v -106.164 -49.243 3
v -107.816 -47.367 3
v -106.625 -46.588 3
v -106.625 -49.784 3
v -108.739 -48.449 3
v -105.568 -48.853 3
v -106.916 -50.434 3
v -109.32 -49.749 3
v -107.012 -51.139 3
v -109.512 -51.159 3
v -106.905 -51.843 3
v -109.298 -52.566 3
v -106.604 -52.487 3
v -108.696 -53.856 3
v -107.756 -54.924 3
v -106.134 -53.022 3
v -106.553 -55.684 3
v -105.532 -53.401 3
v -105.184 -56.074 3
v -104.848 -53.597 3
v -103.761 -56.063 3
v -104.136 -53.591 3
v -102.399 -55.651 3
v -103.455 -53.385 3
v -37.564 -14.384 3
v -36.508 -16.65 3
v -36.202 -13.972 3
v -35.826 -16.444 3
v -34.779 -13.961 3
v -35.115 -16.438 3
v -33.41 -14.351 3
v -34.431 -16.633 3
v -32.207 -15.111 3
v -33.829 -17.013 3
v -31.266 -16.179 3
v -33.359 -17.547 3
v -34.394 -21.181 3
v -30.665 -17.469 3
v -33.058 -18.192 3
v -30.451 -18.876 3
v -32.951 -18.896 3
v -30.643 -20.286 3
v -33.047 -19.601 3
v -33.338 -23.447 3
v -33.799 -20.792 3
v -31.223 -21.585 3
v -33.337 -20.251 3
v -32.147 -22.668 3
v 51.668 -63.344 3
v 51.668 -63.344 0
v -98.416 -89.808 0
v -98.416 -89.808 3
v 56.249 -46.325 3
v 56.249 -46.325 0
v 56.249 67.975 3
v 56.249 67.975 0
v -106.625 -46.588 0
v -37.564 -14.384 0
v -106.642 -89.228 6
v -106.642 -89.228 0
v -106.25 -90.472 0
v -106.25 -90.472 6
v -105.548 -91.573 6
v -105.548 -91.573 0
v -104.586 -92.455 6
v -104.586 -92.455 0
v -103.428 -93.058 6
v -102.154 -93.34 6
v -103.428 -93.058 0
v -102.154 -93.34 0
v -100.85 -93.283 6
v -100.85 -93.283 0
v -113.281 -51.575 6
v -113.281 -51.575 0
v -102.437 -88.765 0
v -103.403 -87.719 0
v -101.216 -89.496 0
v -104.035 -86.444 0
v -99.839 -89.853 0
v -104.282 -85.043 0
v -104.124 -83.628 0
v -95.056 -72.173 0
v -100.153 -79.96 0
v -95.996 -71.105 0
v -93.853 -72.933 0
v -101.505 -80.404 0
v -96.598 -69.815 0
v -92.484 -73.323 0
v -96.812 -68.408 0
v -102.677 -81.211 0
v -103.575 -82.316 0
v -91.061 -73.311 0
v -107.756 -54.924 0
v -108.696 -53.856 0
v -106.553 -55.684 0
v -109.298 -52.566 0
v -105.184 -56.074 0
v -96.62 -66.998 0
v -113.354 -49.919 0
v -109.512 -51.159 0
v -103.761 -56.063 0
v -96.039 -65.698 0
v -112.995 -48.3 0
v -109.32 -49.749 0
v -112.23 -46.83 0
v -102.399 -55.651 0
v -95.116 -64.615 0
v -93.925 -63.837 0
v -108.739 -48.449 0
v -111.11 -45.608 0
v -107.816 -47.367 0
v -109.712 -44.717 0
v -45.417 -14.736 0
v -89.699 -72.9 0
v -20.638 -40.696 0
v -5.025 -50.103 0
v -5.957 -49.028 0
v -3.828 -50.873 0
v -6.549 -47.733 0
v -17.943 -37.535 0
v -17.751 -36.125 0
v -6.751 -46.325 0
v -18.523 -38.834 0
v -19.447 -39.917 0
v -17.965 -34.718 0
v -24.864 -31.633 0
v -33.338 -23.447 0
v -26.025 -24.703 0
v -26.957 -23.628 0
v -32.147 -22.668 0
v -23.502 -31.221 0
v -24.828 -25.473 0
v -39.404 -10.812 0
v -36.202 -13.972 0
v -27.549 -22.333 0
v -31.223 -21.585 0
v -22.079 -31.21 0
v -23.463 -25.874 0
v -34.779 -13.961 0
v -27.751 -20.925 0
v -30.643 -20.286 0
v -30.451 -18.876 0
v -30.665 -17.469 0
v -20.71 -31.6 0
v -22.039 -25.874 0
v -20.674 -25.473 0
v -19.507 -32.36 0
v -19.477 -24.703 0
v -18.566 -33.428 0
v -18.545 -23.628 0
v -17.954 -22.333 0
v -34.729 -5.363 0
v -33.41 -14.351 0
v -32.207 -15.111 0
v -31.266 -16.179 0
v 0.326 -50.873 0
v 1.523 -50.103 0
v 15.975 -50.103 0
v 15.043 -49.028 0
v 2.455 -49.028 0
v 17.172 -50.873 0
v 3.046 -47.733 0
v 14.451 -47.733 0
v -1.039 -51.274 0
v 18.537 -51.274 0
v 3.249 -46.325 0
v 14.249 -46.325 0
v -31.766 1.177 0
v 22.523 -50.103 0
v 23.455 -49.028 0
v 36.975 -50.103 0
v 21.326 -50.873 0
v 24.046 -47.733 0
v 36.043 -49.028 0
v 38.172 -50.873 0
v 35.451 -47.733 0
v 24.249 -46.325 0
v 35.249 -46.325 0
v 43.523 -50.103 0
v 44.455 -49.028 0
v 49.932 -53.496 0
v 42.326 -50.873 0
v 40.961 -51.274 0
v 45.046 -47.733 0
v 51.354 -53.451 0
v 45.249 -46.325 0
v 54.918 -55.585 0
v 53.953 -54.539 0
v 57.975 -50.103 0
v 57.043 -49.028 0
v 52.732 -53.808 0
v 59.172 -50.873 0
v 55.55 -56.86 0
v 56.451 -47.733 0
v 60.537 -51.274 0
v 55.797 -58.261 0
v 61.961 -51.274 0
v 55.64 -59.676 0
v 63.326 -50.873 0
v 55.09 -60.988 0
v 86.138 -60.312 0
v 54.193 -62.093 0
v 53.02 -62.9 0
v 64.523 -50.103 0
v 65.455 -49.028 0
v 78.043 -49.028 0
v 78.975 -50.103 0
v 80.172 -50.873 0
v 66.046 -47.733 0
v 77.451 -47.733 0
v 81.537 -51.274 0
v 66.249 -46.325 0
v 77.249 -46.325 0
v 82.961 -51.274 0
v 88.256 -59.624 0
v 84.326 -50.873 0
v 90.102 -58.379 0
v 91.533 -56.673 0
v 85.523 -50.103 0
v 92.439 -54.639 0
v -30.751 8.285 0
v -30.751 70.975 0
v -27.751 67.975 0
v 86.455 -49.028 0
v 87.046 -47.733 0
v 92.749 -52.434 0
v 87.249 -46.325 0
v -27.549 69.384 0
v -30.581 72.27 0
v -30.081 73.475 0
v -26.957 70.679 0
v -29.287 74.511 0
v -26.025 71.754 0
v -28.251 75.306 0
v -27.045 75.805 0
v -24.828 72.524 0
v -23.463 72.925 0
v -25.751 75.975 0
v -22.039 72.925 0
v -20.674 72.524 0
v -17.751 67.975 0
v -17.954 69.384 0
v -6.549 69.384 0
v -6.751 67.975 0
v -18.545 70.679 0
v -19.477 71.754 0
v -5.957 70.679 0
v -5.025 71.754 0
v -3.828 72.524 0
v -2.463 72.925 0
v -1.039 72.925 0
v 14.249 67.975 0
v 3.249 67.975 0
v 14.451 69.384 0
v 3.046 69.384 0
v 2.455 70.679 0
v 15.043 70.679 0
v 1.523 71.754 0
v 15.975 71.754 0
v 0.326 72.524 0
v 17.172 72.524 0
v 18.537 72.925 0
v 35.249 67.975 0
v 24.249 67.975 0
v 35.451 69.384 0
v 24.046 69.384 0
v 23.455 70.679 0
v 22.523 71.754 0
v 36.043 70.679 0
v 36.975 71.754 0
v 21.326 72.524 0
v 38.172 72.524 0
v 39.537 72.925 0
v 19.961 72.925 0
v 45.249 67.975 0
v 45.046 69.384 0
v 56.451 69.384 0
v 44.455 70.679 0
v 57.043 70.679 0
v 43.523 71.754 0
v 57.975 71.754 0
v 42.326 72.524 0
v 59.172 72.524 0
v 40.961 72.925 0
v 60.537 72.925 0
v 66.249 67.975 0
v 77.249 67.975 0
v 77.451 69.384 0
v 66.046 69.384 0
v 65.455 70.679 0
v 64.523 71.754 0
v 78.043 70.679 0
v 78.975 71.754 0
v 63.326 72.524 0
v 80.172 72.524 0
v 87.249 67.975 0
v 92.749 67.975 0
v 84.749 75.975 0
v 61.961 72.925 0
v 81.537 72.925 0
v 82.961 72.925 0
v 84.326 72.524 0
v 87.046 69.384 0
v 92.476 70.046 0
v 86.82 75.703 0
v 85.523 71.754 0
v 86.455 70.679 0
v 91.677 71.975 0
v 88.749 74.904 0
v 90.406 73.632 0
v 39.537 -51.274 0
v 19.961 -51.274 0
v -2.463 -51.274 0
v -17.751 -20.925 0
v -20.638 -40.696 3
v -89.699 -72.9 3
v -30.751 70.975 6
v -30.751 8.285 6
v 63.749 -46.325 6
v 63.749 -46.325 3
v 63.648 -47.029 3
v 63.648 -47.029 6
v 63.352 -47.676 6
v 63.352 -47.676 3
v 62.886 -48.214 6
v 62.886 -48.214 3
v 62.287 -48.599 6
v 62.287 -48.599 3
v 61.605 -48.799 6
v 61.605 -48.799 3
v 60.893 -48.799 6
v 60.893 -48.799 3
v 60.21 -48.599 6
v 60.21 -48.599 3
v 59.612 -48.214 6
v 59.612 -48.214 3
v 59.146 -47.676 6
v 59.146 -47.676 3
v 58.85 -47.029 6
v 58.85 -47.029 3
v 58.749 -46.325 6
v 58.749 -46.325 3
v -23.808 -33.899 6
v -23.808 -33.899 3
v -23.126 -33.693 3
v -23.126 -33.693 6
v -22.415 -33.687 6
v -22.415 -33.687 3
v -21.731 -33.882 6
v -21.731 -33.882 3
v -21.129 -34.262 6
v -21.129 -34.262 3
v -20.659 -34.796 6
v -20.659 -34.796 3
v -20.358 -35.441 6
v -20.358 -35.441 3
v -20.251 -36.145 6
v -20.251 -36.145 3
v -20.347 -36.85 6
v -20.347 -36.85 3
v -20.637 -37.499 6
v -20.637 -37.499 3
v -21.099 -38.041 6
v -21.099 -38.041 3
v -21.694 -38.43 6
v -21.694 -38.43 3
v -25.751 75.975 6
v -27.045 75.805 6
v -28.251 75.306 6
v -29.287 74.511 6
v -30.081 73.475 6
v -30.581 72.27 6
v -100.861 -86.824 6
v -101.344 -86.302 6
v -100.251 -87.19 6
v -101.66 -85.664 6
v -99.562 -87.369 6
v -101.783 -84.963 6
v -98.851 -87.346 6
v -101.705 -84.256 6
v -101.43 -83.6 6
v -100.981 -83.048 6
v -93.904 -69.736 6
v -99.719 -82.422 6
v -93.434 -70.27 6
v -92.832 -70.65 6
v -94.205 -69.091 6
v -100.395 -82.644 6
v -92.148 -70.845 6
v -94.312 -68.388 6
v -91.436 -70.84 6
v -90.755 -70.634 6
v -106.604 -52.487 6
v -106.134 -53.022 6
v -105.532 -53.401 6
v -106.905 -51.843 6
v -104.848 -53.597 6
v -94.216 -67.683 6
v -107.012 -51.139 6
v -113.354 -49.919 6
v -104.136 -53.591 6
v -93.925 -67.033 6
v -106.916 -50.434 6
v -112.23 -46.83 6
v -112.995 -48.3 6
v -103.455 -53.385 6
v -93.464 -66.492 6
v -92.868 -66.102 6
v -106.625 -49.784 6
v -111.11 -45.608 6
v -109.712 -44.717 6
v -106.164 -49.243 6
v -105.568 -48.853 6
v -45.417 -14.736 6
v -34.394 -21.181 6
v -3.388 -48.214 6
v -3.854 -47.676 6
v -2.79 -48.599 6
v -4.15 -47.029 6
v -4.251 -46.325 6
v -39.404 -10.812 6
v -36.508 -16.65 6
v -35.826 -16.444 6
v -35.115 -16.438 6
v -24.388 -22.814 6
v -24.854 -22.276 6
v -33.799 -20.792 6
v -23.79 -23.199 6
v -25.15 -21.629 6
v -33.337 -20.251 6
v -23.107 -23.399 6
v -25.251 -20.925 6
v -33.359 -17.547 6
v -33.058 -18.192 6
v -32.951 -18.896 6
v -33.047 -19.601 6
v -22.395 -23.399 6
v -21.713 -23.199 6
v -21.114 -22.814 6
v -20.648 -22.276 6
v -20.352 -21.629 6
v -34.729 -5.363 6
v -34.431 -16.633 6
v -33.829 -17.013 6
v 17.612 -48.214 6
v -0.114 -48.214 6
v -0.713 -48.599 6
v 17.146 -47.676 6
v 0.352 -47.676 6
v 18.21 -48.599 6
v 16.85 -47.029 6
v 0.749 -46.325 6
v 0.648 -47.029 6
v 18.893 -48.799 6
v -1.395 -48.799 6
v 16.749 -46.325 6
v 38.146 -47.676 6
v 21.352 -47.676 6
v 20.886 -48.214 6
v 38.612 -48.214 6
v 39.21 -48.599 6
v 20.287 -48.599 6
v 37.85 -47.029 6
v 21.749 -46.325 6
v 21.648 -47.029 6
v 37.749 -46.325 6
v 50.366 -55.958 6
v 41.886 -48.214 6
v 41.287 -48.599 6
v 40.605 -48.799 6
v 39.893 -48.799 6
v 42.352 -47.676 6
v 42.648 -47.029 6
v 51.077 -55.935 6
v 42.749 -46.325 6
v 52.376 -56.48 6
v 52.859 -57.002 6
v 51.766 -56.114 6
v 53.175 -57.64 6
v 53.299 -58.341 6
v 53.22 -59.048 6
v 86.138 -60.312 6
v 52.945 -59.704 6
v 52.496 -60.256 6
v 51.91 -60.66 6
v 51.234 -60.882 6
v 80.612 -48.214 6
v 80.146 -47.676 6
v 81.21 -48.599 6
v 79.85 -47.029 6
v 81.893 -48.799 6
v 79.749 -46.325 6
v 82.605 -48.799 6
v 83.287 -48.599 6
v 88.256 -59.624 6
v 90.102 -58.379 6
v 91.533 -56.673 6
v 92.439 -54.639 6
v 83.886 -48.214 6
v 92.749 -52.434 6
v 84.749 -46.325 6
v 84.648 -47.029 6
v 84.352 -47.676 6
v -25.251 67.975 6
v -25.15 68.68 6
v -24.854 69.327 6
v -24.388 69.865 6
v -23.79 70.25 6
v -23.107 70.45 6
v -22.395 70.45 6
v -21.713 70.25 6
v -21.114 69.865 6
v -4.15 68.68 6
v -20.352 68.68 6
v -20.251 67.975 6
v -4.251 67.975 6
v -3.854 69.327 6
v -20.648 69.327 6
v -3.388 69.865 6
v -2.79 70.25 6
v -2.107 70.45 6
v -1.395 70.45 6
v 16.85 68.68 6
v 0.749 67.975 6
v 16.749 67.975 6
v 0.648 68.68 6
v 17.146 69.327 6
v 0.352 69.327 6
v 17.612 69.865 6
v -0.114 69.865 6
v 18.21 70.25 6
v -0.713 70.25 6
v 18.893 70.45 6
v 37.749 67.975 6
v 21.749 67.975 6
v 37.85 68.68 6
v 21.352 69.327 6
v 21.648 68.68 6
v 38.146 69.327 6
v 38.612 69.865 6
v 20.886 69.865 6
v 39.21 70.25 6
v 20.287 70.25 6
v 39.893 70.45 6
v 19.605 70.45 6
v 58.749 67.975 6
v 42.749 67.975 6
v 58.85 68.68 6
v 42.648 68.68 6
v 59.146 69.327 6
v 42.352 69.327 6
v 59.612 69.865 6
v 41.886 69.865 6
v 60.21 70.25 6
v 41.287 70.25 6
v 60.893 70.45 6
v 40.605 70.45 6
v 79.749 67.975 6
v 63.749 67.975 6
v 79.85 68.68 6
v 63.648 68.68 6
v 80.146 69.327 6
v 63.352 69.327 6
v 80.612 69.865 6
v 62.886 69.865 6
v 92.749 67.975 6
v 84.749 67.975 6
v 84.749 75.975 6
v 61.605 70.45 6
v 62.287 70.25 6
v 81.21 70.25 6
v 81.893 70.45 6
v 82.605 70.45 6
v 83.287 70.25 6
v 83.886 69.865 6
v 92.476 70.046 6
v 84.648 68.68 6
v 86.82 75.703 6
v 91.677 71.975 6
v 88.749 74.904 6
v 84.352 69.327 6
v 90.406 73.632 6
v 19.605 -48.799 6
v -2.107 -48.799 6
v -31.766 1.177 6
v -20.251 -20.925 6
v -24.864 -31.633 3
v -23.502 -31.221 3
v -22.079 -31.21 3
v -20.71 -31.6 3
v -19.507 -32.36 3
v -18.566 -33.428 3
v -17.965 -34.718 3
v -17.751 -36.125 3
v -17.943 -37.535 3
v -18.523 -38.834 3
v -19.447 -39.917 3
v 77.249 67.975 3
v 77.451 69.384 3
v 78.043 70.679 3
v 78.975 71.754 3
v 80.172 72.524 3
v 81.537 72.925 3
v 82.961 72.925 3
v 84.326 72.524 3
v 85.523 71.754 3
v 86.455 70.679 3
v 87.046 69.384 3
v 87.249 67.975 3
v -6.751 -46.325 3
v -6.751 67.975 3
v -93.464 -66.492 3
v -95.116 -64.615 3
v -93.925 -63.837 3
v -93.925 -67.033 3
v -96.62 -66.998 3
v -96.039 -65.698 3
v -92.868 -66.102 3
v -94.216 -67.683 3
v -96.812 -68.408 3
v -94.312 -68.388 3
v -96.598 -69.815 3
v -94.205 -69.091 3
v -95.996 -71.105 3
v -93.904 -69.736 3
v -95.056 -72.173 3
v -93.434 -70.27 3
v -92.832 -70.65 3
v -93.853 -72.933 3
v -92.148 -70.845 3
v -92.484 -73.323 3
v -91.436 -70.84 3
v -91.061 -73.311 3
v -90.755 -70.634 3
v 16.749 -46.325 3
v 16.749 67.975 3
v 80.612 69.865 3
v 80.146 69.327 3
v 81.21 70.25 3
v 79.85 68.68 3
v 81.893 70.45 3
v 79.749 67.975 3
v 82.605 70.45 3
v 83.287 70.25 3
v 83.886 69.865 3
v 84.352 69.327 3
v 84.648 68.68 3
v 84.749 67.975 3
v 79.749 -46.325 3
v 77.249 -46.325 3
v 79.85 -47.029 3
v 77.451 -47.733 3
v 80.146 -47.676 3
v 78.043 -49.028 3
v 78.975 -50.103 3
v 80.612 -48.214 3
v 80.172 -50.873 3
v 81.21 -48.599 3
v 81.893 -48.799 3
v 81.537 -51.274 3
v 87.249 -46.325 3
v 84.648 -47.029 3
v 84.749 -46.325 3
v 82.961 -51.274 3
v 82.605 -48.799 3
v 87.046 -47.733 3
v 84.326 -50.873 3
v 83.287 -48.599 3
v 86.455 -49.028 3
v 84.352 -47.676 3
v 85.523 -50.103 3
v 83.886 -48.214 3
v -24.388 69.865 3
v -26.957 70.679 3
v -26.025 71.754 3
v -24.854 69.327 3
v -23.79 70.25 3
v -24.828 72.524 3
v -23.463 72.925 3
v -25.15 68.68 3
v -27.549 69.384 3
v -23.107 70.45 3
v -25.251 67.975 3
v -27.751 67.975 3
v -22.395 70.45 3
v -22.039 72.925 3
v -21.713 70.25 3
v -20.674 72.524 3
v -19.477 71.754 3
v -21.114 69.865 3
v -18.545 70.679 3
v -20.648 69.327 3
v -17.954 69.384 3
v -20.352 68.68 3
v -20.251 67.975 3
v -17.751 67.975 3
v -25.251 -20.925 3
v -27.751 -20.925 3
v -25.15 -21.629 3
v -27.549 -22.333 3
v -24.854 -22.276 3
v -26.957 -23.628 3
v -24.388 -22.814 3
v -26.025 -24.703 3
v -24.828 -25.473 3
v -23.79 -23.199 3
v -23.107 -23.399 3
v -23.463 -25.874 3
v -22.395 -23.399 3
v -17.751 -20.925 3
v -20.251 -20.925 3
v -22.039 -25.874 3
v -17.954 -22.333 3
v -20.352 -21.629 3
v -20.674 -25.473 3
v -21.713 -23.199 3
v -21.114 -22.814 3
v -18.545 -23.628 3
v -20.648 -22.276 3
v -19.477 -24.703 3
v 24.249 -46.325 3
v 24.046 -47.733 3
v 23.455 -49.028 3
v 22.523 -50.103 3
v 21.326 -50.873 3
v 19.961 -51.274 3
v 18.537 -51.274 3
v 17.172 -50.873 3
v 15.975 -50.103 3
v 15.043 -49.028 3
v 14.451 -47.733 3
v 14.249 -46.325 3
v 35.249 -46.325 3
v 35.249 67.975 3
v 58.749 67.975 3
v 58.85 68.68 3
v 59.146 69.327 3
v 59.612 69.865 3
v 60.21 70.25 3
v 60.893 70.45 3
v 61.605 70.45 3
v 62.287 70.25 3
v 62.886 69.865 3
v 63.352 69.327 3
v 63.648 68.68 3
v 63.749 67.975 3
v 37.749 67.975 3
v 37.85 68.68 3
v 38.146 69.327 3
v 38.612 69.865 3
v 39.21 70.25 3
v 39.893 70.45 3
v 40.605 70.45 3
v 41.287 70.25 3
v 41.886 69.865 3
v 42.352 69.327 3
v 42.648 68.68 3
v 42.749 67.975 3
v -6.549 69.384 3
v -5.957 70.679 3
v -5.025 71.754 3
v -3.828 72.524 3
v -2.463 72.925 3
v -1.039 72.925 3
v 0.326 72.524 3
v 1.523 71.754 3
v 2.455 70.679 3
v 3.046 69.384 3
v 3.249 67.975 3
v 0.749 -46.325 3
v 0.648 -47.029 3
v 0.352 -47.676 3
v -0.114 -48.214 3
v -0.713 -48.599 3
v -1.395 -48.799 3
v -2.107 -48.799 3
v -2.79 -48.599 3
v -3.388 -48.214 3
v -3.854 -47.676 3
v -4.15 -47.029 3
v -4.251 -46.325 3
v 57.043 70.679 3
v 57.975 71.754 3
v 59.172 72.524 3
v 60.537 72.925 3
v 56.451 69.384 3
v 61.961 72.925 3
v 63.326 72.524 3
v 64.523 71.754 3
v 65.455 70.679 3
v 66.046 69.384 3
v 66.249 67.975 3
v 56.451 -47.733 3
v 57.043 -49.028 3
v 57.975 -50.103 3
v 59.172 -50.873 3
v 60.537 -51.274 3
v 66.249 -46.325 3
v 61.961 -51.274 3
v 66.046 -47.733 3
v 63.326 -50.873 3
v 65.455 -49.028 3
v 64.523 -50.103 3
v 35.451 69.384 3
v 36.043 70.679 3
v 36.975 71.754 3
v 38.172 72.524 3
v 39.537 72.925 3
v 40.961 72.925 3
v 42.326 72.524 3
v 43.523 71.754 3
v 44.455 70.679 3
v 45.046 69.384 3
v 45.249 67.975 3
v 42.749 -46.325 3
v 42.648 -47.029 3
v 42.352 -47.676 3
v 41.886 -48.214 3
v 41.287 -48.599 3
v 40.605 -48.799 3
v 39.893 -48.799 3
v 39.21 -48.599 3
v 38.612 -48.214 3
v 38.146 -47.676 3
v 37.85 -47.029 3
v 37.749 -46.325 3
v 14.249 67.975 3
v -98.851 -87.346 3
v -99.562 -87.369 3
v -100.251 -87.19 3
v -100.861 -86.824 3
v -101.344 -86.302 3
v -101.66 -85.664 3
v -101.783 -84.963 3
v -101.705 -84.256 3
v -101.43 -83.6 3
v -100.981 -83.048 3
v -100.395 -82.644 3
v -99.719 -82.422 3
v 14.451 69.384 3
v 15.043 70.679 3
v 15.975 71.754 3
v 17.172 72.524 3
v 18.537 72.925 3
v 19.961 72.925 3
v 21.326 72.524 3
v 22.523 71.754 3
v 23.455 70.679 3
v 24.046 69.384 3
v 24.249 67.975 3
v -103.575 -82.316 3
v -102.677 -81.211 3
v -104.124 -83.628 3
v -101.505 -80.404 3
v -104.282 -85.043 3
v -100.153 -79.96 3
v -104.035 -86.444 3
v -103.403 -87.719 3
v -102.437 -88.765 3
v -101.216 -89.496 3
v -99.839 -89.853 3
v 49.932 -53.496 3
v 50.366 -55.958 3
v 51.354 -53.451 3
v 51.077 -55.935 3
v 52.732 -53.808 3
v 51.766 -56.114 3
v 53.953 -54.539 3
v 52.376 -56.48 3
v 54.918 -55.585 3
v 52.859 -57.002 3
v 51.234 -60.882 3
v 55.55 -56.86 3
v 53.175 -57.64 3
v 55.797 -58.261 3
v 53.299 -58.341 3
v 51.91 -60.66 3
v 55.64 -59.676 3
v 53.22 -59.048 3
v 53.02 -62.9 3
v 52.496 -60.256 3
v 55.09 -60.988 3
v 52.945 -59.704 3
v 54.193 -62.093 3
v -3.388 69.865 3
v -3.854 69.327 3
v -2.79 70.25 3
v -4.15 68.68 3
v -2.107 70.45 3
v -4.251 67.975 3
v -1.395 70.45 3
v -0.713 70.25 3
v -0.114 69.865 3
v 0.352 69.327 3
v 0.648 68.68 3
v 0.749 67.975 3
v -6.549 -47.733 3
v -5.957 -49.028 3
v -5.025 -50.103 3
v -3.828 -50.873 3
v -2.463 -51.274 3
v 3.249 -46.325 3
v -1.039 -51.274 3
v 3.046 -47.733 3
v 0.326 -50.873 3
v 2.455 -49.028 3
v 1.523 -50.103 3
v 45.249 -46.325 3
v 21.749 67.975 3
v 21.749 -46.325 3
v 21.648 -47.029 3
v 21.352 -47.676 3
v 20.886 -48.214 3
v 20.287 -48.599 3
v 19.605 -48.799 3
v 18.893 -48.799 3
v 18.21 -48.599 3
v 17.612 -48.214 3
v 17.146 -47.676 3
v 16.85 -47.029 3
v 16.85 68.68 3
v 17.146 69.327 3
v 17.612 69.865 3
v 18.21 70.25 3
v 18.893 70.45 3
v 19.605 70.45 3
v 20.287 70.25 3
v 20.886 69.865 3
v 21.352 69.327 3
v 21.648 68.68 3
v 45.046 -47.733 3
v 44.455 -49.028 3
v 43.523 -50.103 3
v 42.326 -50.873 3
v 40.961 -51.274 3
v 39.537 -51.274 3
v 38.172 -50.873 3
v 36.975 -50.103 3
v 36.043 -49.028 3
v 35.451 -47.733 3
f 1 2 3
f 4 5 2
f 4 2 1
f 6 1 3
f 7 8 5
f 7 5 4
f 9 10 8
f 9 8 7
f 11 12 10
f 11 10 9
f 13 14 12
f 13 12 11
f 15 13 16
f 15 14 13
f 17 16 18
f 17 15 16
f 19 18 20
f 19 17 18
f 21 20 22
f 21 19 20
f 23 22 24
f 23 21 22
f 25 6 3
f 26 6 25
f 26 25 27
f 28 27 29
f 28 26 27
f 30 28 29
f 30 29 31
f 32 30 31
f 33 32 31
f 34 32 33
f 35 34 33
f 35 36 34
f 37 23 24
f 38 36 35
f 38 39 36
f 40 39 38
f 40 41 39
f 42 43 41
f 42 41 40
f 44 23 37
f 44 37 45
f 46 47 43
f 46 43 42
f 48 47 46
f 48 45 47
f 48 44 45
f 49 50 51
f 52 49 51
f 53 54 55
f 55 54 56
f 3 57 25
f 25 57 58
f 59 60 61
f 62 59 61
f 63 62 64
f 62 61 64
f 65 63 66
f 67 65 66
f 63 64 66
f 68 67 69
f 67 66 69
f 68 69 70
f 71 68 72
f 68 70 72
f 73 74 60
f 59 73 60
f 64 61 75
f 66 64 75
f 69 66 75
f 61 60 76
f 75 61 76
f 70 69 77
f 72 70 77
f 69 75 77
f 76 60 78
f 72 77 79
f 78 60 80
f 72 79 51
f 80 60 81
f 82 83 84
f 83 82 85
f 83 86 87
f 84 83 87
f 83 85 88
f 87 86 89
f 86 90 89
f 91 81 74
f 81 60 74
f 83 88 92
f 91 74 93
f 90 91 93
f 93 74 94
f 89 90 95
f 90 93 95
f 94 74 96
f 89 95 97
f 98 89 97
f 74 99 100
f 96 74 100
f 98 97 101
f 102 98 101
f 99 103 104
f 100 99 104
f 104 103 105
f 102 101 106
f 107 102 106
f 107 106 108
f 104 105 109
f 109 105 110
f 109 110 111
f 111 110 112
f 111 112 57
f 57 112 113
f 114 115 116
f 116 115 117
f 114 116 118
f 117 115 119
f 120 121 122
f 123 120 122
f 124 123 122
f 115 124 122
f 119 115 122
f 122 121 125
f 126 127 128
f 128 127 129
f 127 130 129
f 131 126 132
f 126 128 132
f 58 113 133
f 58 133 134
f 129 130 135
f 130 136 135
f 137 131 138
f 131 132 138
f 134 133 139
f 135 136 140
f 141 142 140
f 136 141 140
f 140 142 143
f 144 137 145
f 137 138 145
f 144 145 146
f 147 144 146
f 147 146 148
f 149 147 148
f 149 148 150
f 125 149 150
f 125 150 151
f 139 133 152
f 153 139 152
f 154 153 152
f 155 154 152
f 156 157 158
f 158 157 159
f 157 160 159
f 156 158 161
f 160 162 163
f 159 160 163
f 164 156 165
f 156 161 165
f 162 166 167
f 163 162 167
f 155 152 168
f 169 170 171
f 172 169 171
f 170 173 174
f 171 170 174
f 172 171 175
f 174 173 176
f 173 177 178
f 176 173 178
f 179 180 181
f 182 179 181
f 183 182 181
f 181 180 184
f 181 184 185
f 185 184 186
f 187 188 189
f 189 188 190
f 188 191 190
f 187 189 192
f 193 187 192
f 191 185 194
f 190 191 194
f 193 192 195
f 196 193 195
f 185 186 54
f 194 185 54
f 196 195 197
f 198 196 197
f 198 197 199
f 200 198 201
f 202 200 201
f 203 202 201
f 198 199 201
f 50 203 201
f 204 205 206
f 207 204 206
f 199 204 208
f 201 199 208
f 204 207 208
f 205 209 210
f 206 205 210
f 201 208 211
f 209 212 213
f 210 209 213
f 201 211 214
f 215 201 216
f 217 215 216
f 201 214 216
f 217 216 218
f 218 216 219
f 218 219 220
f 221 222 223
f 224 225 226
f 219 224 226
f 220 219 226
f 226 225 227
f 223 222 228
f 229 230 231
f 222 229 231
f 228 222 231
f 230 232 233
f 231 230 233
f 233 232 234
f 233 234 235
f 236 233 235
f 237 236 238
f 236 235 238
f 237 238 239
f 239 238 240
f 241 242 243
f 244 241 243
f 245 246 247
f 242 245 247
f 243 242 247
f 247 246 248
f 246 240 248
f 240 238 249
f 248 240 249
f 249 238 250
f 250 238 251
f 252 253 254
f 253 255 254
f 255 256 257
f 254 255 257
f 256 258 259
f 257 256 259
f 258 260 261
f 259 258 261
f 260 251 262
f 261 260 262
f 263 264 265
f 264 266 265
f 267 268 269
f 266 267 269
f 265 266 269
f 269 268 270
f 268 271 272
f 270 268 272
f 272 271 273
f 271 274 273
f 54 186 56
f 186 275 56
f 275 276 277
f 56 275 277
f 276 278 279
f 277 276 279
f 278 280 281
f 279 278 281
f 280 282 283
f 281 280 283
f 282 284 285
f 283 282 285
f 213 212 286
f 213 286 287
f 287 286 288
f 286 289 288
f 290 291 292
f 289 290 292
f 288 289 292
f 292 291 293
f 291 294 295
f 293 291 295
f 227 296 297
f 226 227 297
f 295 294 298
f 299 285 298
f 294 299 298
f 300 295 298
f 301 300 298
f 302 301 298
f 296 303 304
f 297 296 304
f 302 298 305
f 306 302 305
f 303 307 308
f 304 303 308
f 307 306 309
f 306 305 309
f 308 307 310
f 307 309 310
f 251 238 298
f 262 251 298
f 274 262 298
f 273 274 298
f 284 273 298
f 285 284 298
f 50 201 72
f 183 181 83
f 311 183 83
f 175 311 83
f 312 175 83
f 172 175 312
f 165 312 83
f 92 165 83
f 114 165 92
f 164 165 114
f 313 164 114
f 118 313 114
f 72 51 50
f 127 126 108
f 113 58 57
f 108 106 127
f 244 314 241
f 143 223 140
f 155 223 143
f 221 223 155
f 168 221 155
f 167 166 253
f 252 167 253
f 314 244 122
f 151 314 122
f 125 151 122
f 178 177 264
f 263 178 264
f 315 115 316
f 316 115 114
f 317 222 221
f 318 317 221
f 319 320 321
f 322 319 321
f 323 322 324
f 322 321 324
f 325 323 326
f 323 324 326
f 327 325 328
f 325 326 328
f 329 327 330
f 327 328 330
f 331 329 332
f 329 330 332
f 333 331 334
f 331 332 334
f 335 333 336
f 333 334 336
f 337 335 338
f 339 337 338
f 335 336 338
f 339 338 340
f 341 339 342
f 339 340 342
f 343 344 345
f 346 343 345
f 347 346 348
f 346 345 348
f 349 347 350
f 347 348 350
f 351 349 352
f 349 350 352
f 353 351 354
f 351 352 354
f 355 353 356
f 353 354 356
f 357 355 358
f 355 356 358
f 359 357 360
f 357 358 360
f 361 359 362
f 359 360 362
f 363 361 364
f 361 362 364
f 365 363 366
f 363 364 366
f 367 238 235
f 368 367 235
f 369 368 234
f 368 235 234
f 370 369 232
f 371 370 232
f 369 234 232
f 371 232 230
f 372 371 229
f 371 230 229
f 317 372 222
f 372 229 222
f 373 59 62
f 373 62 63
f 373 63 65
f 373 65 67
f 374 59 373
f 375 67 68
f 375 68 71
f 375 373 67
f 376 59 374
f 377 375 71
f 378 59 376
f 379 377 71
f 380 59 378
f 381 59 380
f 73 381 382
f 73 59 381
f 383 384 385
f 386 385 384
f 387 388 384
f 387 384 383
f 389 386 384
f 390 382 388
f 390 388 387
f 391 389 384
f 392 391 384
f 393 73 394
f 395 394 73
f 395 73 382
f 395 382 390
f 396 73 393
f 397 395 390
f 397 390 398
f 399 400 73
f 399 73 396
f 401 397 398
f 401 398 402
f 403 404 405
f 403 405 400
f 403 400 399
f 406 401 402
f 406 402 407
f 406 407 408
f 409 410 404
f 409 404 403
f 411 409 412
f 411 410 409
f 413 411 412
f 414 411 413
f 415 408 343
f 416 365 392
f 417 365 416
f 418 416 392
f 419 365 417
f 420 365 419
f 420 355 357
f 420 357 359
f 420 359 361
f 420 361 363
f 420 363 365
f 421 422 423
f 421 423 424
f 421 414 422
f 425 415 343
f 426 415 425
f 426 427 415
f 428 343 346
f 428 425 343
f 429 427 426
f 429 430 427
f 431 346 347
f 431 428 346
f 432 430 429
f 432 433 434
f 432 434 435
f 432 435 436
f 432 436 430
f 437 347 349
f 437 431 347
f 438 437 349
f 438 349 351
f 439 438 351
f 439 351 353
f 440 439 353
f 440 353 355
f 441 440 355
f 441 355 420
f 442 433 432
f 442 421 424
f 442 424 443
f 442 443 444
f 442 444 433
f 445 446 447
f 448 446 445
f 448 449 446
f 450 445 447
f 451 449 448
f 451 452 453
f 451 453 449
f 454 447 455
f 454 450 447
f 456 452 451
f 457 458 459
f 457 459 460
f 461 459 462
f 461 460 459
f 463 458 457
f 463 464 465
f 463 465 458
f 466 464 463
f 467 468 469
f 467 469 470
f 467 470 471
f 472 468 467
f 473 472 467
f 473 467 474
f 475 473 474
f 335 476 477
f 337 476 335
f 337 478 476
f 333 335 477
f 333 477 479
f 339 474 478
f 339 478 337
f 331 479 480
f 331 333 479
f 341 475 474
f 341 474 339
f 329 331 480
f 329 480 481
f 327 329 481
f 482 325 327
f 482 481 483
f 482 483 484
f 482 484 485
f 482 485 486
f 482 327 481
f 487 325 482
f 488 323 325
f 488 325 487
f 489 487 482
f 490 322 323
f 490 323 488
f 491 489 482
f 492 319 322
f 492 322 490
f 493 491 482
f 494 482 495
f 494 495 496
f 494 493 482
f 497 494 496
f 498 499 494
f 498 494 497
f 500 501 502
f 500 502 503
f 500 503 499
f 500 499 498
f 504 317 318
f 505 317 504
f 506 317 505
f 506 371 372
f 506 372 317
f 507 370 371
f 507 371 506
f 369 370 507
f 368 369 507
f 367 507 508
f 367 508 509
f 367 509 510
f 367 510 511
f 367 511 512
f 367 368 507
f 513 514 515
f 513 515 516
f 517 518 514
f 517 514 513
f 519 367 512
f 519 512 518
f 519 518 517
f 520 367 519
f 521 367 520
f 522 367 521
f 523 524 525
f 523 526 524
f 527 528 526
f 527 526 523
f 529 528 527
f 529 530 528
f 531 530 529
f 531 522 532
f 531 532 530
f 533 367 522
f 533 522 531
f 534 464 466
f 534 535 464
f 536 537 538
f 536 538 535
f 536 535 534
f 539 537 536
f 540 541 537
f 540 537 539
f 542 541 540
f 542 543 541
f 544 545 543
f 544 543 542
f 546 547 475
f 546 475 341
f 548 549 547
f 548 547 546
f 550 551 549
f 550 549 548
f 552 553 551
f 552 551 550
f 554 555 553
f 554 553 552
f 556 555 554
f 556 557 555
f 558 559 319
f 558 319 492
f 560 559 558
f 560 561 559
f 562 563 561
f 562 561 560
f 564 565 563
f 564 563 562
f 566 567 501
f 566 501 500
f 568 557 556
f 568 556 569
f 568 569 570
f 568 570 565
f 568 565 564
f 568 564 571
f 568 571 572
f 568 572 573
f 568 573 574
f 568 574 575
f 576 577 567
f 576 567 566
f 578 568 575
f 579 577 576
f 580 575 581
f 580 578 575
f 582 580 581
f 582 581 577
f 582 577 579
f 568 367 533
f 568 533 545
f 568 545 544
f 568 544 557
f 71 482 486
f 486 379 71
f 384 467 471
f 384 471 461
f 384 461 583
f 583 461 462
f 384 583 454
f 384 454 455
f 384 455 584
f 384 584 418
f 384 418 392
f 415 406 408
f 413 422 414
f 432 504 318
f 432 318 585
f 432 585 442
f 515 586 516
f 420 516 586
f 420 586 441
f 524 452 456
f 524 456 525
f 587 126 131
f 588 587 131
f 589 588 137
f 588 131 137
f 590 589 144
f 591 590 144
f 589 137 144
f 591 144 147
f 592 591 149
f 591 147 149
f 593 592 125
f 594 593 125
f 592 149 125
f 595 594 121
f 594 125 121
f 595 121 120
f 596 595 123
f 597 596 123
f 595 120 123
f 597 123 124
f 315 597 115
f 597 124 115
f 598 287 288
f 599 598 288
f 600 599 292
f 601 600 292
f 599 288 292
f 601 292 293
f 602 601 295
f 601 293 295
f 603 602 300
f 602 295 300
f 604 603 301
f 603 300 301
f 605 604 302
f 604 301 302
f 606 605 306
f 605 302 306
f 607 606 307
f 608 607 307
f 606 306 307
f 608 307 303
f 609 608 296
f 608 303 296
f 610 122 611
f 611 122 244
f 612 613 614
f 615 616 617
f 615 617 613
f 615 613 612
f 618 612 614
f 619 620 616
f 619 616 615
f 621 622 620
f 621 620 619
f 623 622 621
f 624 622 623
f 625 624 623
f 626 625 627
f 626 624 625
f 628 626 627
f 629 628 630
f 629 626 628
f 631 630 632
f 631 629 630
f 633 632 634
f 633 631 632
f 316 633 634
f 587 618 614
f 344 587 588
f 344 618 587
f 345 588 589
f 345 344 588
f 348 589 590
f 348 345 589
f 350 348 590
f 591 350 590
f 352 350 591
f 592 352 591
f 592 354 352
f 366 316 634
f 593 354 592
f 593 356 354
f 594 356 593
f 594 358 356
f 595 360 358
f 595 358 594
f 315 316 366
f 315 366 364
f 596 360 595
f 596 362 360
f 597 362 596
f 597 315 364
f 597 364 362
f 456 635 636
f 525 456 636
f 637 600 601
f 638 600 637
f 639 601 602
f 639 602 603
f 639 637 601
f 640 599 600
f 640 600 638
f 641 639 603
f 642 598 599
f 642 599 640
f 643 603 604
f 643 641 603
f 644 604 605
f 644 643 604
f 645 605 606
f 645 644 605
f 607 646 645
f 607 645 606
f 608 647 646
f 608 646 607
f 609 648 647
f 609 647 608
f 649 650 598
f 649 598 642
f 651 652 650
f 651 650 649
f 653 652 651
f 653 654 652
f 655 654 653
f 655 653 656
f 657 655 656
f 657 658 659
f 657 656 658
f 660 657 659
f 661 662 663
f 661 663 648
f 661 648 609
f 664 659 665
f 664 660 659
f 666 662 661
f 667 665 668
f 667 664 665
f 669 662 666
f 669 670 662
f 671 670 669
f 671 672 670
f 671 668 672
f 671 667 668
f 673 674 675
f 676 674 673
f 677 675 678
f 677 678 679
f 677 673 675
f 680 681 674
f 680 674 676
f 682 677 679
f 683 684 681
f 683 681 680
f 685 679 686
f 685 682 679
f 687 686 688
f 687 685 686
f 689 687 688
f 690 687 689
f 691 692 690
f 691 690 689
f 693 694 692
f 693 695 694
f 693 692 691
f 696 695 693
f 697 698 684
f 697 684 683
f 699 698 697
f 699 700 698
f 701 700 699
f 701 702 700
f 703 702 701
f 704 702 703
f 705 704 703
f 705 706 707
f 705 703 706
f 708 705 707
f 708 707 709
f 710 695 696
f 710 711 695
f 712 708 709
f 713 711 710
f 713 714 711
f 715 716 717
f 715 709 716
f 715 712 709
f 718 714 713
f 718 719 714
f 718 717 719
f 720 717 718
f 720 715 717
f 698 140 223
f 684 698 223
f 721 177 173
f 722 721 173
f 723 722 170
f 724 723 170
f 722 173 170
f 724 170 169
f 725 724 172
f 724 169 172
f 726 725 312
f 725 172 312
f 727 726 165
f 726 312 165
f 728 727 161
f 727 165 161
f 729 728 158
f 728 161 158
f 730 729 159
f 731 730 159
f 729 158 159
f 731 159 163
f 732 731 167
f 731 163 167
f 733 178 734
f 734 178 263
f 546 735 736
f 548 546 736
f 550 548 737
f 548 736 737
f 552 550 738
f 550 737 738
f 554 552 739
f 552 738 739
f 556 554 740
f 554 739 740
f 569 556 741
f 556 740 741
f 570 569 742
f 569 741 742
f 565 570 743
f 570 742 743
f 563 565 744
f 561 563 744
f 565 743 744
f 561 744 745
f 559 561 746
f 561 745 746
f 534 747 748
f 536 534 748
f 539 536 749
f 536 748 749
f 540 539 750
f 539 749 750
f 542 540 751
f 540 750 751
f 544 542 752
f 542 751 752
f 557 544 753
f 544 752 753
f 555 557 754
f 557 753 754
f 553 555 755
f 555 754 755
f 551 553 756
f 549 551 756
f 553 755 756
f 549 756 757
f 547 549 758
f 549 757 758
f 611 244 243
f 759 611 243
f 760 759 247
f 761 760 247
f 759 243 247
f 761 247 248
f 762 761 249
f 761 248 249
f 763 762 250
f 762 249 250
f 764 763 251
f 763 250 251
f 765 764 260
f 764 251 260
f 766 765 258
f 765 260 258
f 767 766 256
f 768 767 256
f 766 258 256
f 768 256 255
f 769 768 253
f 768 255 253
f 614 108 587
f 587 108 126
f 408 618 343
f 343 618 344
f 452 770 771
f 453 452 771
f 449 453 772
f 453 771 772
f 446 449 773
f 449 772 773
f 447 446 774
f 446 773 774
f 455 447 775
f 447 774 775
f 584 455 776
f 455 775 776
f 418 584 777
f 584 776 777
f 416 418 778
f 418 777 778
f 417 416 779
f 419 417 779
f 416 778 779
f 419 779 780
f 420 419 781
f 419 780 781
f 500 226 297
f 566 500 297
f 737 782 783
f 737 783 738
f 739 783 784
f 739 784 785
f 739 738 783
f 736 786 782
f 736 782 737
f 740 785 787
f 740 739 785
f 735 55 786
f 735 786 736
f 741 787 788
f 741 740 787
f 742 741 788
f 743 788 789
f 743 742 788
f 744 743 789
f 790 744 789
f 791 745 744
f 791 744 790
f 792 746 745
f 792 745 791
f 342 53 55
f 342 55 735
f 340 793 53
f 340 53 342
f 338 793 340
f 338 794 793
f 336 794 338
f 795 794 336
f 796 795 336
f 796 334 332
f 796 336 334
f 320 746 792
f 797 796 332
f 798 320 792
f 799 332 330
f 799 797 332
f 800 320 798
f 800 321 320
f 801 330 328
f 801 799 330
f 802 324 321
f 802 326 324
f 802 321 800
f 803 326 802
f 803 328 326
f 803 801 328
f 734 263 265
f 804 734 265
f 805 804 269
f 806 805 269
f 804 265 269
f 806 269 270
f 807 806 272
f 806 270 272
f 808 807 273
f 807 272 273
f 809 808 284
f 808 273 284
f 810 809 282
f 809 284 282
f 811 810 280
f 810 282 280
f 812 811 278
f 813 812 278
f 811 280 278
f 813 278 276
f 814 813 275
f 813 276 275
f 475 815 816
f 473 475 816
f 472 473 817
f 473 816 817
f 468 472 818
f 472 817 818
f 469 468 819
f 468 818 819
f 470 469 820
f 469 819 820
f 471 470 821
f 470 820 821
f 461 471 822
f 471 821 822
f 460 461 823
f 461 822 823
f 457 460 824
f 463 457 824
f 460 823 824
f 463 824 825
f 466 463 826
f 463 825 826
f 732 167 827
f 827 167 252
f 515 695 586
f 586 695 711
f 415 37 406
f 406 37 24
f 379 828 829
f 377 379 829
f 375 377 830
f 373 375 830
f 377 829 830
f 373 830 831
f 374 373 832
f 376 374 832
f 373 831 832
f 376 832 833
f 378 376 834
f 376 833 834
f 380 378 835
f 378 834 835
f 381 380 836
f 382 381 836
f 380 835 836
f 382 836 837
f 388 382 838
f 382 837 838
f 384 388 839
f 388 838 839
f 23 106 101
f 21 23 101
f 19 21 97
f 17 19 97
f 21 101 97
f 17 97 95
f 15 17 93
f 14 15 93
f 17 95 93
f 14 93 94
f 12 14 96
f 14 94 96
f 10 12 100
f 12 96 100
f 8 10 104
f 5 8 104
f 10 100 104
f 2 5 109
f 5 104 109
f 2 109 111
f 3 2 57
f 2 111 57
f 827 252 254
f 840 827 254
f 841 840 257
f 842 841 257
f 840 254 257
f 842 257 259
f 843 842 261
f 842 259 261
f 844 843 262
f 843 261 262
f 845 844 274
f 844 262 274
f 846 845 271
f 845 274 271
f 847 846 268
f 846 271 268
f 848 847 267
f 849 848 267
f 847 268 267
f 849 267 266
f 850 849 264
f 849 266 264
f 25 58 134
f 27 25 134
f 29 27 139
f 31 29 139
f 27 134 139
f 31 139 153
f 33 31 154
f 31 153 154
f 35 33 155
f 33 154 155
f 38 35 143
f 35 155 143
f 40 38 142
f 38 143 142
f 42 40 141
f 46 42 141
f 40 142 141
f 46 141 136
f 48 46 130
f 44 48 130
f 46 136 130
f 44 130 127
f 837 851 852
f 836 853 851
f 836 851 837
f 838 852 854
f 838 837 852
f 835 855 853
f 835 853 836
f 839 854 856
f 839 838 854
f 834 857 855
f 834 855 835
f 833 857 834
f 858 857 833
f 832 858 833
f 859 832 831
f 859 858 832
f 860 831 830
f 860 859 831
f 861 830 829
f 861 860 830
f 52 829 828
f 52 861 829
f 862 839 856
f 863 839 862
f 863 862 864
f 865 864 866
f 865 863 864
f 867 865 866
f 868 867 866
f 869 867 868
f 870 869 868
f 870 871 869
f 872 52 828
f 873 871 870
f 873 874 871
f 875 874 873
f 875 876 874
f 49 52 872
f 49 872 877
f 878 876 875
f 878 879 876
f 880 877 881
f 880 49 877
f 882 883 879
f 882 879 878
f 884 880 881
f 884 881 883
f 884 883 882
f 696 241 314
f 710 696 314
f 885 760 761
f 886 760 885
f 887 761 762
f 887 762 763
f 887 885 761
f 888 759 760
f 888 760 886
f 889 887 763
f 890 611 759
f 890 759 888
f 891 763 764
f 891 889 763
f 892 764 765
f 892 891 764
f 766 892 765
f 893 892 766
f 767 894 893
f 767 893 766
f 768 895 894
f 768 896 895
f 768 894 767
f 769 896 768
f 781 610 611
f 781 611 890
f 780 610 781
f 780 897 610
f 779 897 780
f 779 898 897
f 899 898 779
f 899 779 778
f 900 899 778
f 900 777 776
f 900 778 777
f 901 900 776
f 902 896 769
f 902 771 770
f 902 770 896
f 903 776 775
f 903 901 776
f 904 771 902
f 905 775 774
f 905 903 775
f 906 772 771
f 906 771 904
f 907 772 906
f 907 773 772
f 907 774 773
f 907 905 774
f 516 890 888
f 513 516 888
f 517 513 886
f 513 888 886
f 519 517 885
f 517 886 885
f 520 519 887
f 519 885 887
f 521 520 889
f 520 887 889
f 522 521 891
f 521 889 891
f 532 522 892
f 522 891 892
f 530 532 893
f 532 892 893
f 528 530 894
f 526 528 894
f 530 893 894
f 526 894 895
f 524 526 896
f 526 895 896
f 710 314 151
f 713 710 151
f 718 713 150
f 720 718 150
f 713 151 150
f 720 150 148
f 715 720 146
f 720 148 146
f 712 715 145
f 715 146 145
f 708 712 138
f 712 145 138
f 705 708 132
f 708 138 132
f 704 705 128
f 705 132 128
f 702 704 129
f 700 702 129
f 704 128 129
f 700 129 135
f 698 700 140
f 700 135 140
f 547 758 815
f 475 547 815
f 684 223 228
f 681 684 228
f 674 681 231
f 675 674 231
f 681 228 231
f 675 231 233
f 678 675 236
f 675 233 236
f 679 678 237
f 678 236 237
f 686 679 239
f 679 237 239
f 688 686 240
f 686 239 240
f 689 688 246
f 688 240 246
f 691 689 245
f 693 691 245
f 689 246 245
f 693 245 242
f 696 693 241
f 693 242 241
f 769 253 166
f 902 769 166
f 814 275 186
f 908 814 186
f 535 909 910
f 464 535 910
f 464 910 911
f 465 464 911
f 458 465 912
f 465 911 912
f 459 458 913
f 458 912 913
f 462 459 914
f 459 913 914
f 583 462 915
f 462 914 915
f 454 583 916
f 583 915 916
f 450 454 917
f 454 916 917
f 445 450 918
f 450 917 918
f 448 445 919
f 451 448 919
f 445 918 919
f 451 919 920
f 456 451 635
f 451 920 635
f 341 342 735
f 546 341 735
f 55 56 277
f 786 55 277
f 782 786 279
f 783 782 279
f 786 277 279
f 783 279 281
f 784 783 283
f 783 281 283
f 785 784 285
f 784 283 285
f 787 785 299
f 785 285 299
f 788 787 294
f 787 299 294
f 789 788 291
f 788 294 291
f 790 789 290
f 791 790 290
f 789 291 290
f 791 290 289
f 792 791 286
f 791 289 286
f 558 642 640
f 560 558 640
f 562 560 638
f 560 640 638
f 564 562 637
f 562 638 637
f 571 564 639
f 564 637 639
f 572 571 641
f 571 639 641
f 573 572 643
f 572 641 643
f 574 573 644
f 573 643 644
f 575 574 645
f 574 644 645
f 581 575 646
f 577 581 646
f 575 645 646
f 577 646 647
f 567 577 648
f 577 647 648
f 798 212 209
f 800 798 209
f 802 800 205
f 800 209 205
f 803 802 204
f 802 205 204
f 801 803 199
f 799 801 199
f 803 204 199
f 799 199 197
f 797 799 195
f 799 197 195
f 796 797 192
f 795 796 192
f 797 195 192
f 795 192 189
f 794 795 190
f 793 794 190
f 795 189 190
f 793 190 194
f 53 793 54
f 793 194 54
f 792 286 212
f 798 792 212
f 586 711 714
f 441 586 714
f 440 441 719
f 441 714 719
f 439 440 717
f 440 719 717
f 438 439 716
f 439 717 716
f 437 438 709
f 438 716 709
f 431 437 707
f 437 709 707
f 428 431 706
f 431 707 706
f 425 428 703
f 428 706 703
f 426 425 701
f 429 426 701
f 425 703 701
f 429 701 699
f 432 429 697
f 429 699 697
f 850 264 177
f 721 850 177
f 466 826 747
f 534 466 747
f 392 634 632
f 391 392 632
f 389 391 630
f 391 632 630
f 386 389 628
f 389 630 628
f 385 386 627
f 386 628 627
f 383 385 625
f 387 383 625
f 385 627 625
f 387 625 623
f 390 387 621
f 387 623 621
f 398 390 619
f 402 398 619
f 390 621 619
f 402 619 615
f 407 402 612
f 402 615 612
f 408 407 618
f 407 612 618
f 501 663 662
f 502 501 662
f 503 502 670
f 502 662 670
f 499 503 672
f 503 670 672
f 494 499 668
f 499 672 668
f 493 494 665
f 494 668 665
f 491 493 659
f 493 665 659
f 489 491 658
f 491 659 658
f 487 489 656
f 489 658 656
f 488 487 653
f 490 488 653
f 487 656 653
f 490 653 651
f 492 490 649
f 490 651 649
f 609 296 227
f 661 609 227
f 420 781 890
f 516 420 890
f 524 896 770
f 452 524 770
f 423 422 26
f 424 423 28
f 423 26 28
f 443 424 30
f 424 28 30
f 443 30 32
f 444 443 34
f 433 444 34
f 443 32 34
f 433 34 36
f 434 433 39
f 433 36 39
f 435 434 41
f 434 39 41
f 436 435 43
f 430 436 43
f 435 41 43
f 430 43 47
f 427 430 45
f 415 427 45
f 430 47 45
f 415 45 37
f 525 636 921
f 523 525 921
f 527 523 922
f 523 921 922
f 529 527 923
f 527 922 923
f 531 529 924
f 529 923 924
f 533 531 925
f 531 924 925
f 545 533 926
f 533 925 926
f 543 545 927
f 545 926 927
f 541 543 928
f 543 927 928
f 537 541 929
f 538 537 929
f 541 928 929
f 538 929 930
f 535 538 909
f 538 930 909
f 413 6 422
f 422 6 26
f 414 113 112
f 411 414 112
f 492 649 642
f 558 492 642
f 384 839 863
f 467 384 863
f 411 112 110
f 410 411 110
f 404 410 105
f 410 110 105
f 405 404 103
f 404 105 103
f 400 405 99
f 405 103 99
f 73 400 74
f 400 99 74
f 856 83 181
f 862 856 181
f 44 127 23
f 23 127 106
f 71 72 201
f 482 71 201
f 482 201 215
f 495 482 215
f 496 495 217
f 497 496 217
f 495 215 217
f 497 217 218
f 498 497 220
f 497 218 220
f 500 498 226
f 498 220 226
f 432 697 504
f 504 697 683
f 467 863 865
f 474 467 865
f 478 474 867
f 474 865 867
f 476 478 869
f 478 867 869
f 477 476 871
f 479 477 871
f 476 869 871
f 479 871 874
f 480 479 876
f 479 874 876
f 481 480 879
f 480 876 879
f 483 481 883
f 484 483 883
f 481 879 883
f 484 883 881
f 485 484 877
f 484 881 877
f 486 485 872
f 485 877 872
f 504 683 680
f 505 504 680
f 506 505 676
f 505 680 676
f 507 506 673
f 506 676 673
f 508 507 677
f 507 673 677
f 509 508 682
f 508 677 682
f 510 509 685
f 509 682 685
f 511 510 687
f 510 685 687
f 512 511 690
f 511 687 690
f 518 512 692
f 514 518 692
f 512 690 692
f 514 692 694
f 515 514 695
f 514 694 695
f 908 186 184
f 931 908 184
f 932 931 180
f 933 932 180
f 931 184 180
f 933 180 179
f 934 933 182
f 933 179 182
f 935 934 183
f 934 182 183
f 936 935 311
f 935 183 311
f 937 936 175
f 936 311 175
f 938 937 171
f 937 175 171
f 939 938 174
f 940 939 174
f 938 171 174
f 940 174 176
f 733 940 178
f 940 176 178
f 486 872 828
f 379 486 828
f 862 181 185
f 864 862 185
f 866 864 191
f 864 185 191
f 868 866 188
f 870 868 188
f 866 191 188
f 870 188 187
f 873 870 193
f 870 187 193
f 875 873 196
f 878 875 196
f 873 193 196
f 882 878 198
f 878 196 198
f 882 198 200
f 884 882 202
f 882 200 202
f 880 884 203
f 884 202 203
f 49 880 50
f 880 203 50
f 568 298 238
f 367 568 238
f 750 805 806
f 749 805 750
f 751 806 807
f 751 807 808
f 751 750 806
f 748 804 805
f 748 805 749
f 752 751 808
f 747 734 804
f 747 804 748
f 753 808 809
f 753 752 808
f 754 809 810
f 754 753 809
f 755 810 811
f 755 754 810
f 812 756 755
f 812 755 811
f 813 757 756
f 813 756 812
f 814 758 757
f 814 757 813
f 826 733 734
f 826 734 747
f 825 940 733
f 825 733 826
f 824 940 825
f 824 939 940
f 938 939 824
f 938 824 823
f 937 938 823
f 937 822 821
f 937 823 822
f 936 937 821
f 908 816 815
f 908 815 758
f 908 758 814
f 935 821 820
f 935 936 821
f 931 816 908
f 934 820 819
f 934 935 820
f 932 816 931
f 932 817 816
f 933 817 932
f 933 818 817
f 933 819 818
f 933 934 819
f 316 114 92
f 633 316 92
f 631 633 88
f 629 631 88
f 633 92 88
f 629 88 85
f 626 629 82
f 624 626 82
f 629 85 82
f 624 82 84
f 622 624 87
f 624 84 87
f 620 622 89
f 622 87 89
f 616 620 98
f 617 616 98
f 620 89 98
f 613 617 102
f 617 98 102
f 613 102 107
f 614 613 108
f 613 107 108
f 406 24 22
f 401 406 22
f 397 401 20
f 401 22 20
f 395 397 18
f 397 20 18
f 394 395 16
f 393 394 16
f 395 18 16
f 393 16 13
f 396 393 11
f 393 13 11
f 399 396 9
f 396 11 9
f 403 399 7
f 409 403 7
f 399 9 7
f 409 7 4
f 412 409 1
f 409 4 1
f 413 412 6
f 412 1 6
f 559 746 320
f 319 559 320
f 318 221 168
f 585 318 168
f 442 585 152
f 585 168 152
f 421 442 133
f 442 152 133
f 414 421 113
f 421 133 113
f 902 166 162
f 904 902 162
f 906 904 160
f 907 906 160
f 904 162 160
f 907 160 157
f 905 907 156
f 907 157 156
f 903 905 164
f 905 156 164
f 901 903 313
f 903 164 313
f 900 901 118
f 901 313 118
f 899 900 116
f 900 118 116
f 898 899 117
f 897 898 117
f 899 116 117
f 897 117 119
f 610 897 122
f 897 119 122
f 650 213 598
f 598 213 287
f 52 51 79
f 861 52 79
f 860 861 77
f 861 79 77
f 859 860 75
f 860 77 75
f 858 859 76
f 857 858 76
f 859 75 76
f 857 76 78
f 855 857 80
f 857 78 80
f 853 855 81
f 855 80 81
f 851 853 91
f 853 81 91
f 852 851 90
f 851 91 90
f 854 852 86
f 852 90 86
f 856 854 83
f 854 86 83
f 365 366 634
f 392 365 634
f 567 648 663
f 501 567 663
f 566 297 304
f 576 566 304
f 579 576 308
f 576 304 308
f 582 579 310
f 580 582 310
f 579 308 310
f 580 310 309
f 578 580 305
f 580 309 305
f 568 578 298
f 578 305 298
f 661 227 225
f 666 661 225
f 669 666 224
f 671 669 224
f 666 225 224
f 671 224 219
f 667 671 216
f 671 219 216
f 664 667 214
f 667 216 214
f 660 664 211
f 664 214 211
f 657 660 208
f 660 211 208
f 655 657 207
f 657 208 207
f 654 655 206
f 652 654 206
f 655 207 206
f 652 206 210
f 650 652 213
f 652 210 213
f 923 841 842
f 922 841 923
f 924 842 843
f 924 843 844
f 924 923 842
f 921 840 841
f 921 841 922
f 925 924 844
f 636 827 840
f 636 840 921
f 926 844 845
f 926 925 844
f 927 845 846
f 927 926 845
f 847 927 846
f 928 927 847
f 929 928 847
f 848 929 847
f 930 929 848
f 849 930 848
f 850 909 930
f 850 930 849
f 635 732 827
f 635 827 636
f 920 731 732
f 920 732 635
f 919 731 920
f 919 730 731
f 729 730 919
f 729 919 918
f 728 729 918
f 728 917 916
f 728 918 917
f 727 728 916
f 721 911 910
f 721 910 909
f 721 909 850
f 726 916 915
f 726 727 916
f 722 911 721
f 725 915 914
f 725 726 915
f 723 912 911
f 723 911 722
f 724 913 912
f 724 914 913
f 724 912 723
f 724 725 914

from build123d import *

# Parameters (mm, degrees)
F1_DEPTH = 6
F3_DEPTH = 3


with BuildPart() as f1:
    # F0 (on Top) → F1 (new body)
    with BuildSketch(Plane.XY):
        with BuildLine():
            Line((84.748961, 75.975446), (-25.751039, 75.975446))
            ThreePointArc((-25.751039, 75.975446), (-29.286573, 74.51098), (-30.751039, 70.975446))
            Line((-30.751039, 70.975446), (-30.751039, 8.284529))
            ThreePointArc((-30.751039, 8.284529), (-34.728897, -5.362881), (-45.416535, -14.735688))
            Line((-45.416535, -14.735688), (-109.711543, -44.716943))
            ThreePointArc((-109.711543, -44.716943), (-112.660436, -47.539893), (-113.281446, -51.574663))
            Line((-113.281446, -51.574663), (-106.642219, -89.227591))
            ThreePointArc((-106.642219, -89.227591), (-104.586062, -92.45511), (-100.849939, -93.283389))
            Line((-100.849939, -93.283389), (86.138146, -60.312344))
            ThreePointArc((86.138146, -60.312344), (90.877316, -57.576183), (92.748961, -52.433882))
            Line((92.748961, -52.433882), (92.748961, 67.975446))
            ThreePointArc((92.748961, 67.975446), (90.405815, 73.632301), (84.748961, 75.975446))
        make_face()
        with BuildLine():
            Line((-21.694494, -38.430323), (-90.755147, -70.633835))
            ThreePointArc((-90.755147, -70.633835), (-94.077462, -69.424611), (-92.868238, -66.102296))
            Line((-92.868238, -66.102296), (-23.807585, -33.898784))
            ThreePointArc((-23.807585, -33.898784), (-20.48527, -35.108008), (-21.694494, -38.430323))
        make_face(mode=Mode.SUBTRACT)
        with BuildLine():
            Line((51.23412, -60.882019), (-98.850581, -87.346002))
            ThreePointArc((-98.850581, -87.346002), (-101.746721, -85.318103), (-99.718822, -82.421963))
            Line((-99.718822, -82.421963), (50.36588, -55.957981))
            ThreePointArc((50.36588, -55.957981), (53.262019, -57.98588), (51.23412, -60.882019))
        make_face(mode=Mode.SUBTRACT)
        with BuildLine():
            Line((-34.394494, -21.181494), (-103.455147, -53.385005))
            ThreePointArc((-103.455147, -53.385005), (-106.777462, -52.175782), (-105.568238, -48.853467))
            Line((-105.568238, -48.853467), (-36.507585, -16.649955))
            ThreePointArc((-36.507585, -16.649955), (-33.18527, -17.859179), (-34.394494, -21.181494))
        make_face(mode=Mode.SUBTRACT)
        with BuildLine():
            Line((-25.251039, -20.924554), (-25.251039, 67.975446))
            ThreePointArc((-25.251039, 67.975446), (-22.751039, 70.475446), (-20.251039, 67.975446))
            Line((-20.251039, 67.975446), (-20.251039, -20.924554))
            ThreePointArc((-20.251039, -20.924554), (-22.751039, -23.424554), (-25.251039, -20.924554))
        make_face(mode=Mode.SUBTRACT)
        with BuildLine():
            Line((-4.251039, -46.324554), (-4.251039, 67.975446))
            ThreePointArc((-4.251039, 67.975446), (-1.751039, 70.475446), (0.748961, 67.975446))
            Line((0.748961, 67.975446), (0.748961, -46.324554))
            ThreePointArc((0.748961, -46.324554), (-1.751039, -48.824554), (-4.251039, -46.324554))
        make_face(mode=Mode.SUBTRACT)
        with BuildLine():
            Line((16.748961, -46.324554), (16.748961, 67.975446))
            ThreePointArc((16.748961, 67.975446), (19.248961, 70.475446), (21.748961, 67.975446))
            Line((21.748961, 67.975446), (21.748961, -46.324554))
            ThreePointArc((21.748961, -46.324554), (19.248961, -48.824554), (16.748961, -46.324554))
        make_face(mode=Mode.SUBTRACT)
        with BuildLine():
            Line((37.748961, -46.324554), (37.748961, 67.975446))
            ThreePointArc((37.748961, 67.975446), (40.248961, 70.475446), (42.748961, 67.975446))
            Line((42.748961, 67.975446), (42.748961, -46.324554))
            ThreePointArc((42.748961, -46.324554), (40.248961, -48.824554), (37.748961, -46.324554))
        make_face(mode=Mode.SUBTRACT)
        with BuildLine():
            Line((58.748961, -46.324554), (58.748961, 67.975446))
            ThreePointArc((58.748961, 67.975446), (61.248961, 70.475446), (63.748961, 67.975446))
            Line((63.748961, 67.975446), (63.748961, -46.324554))
            ThreePointArc((63.748961, -46.324554), (61.248961, -48.824554), (58.748961, -46.324554))
        make_face(mode=Mode.SUBTRACT)
        with BuildLine():
            Line((79.748961, -46.324554), (79.748961, 67.975446))
            ThreePointArc((79.748961, 67.975446), (82.248961, 70.475446), (84.748961, 67.975446))
            Line((84.748961, 67.975446), (84.748961, -46.324554))
            ThreePointArc((84.748961, -46.324554), (82.248961, -48.824554), (79.748961, -46.324554))
        make_face(mode=Mode.SUBTRACT)
    extrude(amount=F1_DEPTH)

    # F2 (on face) → F3 (cut)
    with BuildSketch(Plane(origin=(0, 0, 0), x_dir=(1, 0, 0), z_dir=(0, 0, -1))):
        with BuildLine():
            ThreePointArc((87.248961, 46.324554), (82.248961, 51.324554), (77.248961, 46.324554))
            Line((77.248961, 46.324554), (77.248961, -67.975446))
            ThreePointArc((77.248961, -67.975446), (82.248961, -72.975446), (87.248961, -67.975446))
            Line((87.248961, -67.975446), (87.248961, 46.324554))
        make_face()
        with BuildLine():
            ThreePointArc((66.248961, 46.324554), (61.248961, 51.324554), (56.248961, 46.324554))
            Line((56.248961, 46.324554), (56.248961, -67.975446))
            ThreePointArc((56.248961, -67.975446), (61.248961, -72.975446), (66.248961, -67.975446))
            Line((66.248961, -67.975446), (66.248961, 46.324554))
        make_face()
        with BuildLine():
            ThreePointArc((45.248961, 46.324554), (40.248961, 51.324554), (35.248961, 46.324554))
            Line((35.248961, 46.324554), (35.248961, -67.975446))
            ThreePointArc((35.248961, -67.975446), (40.248961, -72.975446), (45.248961, -67.975446))
            Line((45.248961, -67.975446), (45.248961, 46.324554))
        make_face()
        with BuildLine():
            ThreePointArc((24.248961, 46.324554), (19.248961, 51.324554), (14.248961, 46.324554))
            Line((14.248961, 46.324554), (14.248961, -67.975446))
            ThreePointArc((14.248961, -67.975446), (19.248961, -72.975446), (24.248961, -67.975446))
            Line((24.248961, -67.975446), (24.248961, 46.324554))
        make_face()
        with BuildLine():
            ThreePointArc((3.248961, 46.324554), (-1.751039, 51.324554), (-6.751039, 46.324554))
            Line((-6.751039, 46.324554), (-6.751039, -67.975446))
            ThreePointArc((-6.751039, -67.975446), (-1.751039, -72.975446), (3.248961, -67.975446))
            Line((3.248961, -67.975446), (3.248961, 46.324554))
        make_face()
        with BuildLine():
            ThreePointArc((-24.864131, 31.633015), (-18.2195, 34.051462), (-20.637948, 40.696092))
            Line((-20.637948, 40.696092), (-89.698601, 72.899604))
            ThreePointArc((-89.698601, 72.899604), (-96.343232, 70.481156), (-93.924784, 63.836526))
            Line((-93.924784, 63.836526), (-24.864131, 31.633015))
        make_face()
        with BuildLine():
            ThreePointArc((-17.751039, 20.924554), (-22.751039, 25.924554), (-27.751039, 20.924554))
            Line((-27.751039, 20.924554), (-27.751039, -67.975446))
            ThreePointArc((-27.751039, -67.975446), (-22.751039, -72.975446), (-17.751039, -67.975446))
            Line((-17.751039, -67.975446), (-17.751039, 20.924554))
        make_face()
        with BuildLine():
            ThreePointArc((-37.564131, 14.384186), (-30.9195, 16.802633), (-33.337948, 23.447263))
            Line((-33.337948, 23.447263), (-102.398601, 55.650775))
            ThreePointArc((-102.398601, 55.650775), (-109.043232, 53.232327), (-106.624784, 46.587697))
            Line((-106.624784, 46.587697), (-37.564131, 14.384186))
        make_face()
        with BuildLine():
            ThreePointArc((49.931759, 53.495961), (55.724039, 57.551759), (51.668241, 63.344039))
            Line((51.668241, 63.344039), (-98.416461, 89.808021))
            ThreePointArc((-98.416461, 89.808021), (-104.20874, 85.752223), (-100.152942, 79.959944))
            Line((-100.152942, 79.959944), (49.931759, 53.495961))
        make_face()
    extrude(amount=-F3_DEPTH, mode=Mode.SUBTRACT)


solid = f1.part
